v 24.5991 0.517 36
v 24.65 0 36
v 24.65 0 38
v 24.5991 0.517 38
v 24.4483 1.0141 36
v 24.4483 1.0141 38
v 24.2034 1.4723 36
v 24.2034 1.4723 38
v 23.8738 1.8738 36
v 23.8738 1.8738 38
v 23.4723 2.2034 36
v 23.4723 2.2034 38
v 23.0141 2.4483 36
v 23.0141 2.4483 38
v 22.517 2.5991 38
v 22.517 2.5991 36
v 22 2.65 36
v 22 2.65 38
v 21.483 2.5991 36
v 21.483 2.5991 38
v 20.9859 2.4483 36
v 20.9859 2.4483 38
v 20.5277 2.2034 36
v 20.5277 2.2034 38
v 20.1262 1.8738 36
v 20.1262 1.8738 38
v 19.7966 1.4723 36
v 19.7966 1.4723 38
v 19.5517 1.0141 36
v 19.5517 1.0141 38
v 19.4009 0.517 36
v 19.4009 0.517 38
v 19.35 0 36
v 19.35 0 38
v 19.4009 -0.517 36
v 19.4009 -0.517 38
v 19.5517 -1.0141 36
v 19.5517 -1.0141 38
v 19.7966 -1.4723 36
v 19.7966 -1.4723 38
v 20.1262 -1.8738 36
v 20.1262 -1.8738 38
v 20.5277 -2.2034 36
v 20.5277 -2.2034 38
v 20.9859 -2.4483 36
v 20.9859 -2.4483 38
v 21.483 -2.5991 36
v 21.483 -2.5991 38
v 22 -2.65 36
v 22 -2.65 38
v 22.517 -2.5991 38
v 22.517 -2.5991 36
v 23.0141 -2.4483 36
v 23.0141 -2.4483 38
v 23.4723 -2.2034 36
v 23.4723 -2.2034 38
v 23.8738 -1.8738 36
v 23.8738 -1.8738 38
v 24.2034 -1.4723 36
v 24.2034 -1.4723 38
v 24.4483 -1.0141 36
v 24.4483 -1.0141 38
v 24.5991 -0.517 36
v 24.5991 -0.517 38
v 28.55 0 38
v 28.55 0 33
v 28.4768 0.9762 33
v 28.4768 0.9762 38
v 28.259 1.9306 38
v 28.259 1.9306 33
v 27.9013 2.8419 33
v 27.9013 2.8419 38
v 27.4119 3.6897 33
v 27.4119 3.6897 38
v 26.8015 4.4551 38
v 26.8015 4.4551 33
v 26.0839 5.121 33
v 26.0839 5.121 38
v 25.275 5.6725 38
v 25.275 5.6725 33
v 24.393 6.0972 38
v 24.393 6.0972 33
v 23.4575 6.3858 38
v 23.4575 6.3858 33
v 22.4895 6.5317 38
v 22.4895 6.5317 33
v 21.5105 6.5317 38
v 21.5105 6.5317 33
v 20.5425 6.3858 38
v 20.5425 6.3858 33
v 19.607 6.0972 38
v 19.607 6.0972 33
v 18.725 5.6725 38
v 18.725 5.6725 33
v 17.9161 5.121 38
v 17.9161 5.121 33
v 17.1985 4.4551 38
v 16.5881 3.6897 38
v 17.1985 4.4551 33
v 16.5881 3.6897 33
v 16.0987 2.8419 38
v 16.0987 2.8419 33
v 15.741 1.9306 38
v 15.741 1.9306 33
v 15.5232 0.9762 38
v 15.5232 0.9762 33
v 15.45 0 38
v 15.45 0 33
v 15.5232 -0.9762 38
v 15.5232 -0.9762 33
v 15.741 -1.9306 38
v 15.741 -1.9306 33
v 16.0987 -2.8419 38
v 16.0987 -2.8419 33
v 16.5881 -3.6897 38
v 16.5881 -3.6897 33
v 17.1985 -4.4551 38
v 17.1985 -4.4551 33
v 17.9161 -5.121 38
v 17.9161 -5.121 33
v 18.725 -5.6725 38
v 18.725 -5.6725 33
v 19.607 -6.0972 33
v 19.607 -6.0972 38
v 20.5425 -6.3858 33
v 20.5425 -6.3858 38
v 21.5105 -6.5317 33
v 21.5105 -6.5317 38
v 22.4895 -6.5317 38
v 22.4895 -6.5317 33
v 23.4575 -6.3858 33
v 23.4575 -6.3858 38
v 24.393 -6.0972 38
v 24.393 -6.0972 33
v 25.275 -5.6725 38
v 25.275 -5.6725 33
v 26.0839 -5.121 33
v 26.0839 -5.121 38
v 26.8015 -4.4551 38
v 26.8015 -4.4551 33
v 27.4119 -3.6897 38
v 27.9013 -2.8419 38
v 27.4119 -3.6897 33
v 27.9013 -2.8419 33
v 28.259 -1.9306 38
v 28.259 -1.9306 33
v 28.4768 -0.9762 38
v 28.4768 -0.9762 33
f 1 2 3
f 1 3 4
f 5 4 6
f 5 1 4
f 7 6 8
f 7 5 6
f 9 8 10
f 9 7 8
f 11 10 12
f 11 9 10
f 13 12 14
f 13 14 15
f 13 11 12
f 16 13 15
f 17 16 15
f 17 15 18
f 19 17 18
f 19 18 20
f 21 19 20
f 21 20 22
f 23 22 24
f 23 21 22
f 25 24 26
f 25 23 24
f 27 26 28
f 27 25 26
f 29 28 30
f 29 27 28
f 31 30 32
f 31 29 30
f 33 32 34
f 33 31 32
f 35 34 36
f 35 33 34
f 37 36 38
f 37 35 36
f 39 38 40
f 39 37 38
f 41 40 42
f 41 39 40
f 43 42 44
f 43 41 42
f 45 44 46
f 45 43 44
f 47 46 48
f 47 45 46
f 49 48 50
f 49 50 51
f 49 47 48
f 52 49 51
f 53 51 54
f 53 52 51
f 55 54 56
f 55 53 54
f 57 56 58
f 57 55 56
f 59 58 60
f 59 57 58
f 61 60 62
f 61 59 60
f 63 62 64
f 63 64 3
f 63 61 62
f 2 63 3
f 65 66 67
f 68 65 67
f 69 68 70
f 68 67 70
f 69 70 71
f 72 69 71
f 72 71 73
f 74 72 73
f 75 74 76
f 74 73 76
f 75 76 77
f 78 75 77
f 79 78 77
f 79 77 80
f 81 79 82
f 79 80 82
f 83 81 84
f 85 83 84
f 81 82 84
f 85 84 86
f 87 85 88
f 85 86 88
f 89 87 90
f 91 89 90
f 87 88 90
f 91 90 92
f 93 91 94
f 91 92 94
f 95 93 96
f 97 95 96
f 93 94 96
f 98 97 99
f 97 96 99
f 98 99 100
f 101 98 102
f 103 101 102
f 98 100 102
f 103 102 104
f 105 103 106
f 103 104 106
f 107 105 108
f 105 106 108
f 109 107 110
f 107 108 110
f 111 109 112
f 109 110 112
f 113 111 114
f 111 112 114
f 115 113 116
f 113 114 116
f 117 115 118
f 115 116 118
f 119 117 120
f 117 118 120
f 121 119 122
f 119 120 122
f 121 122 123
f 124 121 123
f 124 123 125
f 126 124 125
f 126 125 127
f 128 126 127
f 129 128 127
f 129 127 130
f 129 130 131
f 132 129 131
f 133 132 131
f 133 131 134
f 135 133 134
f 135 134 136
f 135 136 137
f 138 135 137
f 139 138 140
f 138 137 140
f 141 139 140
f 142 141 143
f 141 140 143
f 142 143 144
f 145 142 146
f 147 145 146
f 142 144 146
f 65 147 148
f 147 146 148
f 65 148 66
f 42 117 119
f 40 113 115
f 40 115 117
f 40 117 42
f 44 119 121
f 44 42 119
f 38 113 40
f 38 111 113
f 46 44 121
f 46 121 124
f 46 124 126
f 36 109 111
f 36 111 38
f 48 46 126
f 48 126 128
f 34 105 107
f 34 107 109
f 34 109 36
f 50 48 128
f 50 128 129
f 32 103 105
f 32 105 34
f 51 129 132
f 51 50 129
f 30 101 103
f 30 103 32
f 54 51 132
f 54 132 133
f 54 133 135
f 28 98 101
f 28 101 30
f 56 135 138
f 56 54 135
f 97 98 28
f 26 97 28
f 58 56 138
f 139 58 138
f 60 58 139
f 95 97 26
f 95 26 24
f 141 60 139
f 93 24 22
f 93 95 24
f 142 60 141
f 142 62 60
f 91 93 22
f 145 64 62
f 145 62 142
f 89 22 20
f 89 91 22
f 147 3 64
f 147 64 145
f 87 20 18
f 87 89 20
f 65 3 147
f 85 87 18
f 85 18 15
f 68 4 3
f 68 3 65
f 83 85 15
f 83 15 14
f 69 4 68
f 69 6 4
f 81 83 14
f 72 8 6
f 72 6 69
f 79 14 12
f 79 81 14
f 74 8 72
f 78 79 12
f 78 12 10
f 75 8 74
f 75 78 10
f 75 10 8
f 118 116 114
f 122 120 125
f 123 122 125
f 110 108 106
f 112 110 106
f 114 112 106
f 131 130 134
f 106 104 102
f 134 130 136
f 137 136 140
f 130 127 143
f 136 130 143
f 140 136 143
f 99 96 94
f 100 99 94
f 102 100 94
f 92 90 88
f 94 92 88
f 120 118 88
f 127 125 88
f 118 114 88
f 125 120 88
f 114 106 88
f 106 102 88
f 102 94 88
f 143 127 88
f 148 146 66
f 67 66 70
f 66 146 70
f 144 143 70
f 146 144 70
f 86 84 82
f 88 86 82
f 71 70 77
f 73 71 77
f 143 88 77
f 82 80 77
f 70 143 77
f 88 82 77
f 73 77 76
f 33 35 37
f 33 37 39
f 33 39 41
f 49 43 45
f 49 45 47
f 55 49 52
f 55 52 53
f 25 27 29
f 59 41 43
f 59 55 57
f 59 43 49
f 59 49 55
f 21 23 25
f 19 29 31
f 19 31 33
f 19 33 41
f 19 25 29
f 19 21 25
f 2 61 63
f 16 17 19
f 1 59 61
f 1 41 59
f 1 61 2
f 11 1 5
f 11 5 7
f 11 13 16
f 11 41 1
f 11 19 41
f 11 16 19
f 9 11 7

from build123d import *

# Parameters (mm, degrees)
CYLINDER017_R     = 2.65
CYLINDER017_DEPTH = 2
CYLINDER016_R     = 6.55
CYLINDER016_DEPTH = 5


with BuildPart() as cylinder017:
    # Cylinder017 → Cylinder017 (new body)
    with BuildSketch(Plane.XY.offset(3)):
        Circle(CYLINDER017_R)
    extrude(amount=CYLINDER017_DEPTH)


with BuildPart() as cut028006004005015:
    # Cylinder016 → Cylinder016 (new body)
    with BuildSketch(Plane.XY):
        Circle(CYLINDER016_R)
    extrude(amount=CYLINDER016_DEPTH)

    # Cut028006004005015: cut Cylinder017
    add(cylinder017.part, mode=Mode.SUBTRACT)


with BuildPart() as cut028006004005015_1:
    # Cut028006004005015 placement: moved
    add(cut028006004005015.part.moved(Location((22, 0, 33))))


solid = cut028006004005015_1.part
